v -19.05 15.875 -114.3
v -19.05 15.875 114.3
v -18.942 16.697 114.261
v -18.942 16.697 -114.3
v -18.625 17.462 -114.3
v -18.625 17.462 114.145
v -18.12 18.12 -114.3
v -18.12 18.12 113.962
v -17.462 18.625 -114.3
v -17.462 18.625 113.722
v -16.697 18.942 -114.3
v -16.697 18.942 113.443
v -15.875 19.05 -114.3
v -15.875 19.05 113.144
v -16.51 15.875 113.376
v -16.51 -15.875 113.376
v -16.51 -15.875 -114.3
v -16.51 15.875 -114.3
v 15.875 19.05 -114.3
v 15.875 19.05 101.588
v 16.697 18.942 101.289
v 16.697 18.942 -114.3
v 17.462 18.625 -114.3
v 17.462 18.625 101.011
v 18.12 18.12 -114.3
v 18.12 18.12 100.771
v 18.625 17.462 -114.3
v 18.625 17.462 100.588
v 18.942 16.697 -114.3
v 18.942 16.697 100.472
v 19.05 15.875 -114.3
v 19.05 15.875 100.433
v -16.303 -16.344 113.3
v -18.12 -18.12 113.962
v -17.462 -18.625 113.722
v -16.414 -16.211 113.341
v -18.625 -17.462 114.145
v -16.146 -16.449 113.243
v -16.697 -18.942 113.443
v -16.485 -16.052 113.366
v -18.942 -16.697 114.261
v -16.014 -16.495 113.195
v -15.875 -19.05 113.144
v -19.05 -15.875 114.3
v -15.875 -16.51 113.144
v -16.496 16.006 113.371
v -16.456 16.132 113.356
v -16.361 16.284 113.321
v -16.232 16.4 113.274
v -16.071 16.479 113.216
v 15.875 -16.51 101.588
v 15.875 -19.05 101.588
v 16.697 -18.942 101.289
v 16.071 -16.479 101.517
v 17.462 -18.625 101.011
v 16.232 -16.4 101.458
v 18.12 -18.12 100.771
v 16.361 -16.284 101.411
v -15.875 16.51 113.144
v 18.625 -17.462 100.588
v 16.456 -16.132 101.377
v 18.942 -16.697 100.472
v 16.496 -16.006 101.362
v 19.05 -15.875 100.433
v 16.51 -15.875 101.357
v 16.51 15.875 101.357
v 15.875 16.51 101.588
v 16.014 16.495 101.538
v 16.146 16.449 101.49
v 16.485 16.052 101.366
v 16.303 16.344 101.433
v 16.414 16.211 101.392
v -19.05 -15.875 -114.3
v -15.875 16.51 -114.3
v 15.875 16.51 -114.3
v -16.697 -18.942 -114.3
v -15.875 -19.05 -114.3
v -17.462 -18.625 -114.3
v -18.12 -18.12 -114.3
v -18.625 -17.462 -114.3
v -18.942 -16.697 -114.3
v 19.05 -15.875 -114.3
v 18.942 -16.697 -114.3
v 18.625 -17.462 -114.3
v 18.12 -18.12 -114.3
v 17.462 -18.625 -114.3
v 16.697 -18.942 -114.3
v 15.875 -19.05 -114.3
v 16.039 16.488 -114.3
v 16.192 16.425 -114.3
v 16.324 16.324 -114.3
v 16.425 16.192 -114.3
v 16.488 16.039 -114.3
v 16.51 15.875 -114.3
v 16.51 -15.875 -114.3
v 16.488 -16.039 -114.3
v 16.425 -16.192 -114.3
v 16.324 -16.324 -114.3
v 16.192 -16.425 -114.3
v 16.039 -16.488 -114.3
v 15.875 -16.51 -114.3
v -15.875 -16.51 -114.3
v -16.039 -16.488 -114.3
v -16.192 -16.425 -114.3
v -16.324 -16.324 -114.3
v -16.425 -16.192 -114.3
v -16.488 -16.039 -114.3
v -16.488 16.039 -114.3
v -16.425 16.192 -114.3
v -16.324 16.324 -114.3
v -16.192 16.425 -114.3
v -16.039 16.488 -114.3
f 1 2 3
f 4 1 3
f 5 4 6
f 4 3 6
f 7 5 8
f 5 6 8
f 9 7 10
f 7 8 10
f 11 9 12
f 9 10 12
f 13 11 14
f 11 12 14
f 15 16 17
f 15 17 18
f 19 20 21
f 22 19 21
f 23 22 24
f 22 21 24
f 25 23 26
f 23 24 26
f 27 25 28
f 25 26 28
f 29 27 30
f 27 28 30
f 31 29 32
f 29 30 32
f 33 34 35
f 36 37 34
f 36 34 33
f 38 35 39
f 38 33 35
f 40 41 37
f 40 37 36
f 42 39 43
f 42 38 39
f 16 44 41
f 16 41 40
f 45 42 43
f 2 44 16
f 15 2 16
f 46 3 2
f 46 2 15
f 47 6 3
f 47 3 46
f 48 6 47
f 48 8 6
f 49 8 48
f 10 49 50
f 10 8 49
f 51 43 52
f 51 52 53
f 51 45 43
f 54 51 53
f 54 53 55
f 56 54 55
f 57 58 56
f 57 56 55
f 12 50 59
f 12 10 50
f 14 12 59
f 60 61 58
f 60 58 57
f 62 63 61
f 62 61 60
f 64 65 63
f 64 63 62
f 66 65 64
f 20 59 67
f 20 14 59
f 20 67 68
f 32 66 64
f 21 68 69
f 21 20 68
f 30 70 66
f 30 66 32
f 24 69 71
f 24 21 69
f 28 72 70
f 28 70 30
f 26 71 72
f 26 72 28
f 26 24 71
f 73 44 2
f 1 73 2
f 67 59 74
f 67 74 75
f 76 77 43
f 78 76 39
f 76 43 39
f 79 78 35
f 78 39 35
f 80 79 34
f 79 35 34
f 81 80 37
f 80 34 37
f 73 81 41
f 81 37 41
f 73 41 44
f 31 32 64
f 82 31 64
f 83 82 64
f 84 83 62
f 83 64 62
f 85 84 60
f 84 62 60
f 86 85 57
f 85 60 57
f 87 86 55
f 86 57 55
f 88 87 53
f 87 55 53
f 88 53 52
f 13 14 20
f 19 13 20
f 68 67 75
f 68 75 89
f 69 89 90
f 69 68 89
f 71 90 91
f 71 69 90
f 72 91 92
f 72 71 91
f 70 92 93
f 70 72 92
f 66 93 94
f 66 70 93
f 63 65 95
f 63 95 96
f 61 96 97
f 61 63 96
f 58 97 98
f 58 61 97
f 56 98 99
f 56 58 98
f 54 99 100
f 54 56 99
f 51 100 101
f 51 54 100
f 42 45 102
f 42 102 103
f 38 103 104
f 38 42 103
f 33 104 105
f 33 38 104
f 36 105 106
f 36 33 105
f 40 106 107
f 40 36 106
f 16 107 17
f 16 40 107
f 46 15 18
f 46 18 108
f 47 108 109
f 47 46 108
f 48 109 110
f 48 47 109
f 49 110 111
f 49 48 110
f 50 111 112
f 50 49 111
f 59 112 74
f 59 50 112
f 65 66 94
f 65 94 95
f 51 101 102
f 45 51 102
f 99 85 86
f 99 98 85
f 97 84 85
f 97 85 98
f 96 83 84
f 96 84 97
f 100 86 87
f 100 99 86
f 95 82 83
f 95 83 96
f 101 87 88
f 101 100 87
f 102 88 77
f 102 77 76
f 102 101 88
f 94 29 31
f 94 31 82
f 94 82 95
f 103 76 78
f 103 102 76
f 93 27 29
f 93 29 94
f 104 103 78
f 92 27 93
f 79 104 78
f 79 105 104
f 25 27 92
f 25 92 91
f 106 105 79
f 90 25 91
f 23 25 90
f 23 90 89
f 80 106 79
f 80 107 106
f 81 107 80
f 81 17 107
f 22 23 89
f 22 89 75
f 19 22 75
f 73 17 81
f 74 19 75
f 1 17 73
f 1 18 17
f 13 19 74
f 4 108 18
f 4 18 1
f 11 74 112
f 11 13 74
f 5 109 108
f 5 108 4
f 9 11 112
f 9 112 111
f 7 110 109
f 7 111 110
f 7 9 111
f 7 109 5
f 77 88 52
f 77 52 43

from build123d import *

# Parameters (mm, degrees)
EXTRUDE_THIN1_DEPTH     = 114.3
CUT_EXTRUDE1_DEPTH      = 1
CUT_EXTRUDE1_DEPTH_BACK = 39.1


with BuildPart() as part:
    # Sketch1 → Extrude-Thin1 (new body, symmetric)
    with BuildSketch(Plane.XY):
        with BuildLine():
            Line((-15.875, 19.05), (15.875, 19.05))
            ThreePointArc((15.875, 19.05), (18.12006403, 18.12006403), (19.05, 15.875))
            Line((19.05, 15.875), (19.05, -15.875))
            ThreePointArc((19.05, -15.875), (18.12006403, -18.12006403), (15.875, -19.05))
            Line((15.875, -19.05), (-15.875, -19.05))
            ThreePointArc((-15.875, -19.05), (-18.12006403, -18.12006403), (-19.05, -15.875))
            Line((-19.05, -15.875), (-19.05, 15.875))
            ThreePointArc((-19.05, 15.875), (-18.12006403, 18.12006403), (-15.875, 19.05))
        make_face()
        with BuildLine():
            Line((-15.875, 16.51), (15.875, 16.51))
            ThreePointArc((15.875, 16.51), (16.324012806, 16.324012806), (16.51, 15.875))
            Line((16.51, 15.875), (16.51, -15.875))
            ThreePointArc((16.51, -15.875), (16.324012806, -16.324012806), (15.875, -16.51))
            Line((15.875, -16.51), (-15.875, -16.51))
            ThreePointArc((-15.875, -16.51), (-16.324012806, -16.324012806), (-16.51, -15.875))
            Line((-16.51, -15.875), (-16.51, 15.875))
            ThreePointArc((-16.51, 15.875), (-16.324012806, 16.324012806), (-15.875, 16.51))
        make_face(mode=Mode.SUBTRACT)
    extrude(amount=EXTRUDE_THIN1_DEPTH, both=True)

    # Sketch3 → Cut-Extrude1 (cut, two sides)
    with BuildSketch(Plane(origin=(0, 19.05, 0), x_dir=(1, 0, 0), z_dir=(0, 1, 0))) as cut_extrude1_sk:
        Polygon((-464.000568463, -276.24876264), (-19.05, -114.3), (19.05, -100.432734074), (464.000568463, 61.516028566), (787.898093744, -828.38510836), (-140.103043182, -1166.149899566), align=None)
    extrude(amount=CUT_EXTRUDE1_DEPTH, mode=Mode.SUBTRACT)
    extrude(cut_extrude1_sk.sketch, amount=-CUT_EXTRUDE1_DEPTH_BACK, mode=Mode.SUBTRACT)


solid = part.part
